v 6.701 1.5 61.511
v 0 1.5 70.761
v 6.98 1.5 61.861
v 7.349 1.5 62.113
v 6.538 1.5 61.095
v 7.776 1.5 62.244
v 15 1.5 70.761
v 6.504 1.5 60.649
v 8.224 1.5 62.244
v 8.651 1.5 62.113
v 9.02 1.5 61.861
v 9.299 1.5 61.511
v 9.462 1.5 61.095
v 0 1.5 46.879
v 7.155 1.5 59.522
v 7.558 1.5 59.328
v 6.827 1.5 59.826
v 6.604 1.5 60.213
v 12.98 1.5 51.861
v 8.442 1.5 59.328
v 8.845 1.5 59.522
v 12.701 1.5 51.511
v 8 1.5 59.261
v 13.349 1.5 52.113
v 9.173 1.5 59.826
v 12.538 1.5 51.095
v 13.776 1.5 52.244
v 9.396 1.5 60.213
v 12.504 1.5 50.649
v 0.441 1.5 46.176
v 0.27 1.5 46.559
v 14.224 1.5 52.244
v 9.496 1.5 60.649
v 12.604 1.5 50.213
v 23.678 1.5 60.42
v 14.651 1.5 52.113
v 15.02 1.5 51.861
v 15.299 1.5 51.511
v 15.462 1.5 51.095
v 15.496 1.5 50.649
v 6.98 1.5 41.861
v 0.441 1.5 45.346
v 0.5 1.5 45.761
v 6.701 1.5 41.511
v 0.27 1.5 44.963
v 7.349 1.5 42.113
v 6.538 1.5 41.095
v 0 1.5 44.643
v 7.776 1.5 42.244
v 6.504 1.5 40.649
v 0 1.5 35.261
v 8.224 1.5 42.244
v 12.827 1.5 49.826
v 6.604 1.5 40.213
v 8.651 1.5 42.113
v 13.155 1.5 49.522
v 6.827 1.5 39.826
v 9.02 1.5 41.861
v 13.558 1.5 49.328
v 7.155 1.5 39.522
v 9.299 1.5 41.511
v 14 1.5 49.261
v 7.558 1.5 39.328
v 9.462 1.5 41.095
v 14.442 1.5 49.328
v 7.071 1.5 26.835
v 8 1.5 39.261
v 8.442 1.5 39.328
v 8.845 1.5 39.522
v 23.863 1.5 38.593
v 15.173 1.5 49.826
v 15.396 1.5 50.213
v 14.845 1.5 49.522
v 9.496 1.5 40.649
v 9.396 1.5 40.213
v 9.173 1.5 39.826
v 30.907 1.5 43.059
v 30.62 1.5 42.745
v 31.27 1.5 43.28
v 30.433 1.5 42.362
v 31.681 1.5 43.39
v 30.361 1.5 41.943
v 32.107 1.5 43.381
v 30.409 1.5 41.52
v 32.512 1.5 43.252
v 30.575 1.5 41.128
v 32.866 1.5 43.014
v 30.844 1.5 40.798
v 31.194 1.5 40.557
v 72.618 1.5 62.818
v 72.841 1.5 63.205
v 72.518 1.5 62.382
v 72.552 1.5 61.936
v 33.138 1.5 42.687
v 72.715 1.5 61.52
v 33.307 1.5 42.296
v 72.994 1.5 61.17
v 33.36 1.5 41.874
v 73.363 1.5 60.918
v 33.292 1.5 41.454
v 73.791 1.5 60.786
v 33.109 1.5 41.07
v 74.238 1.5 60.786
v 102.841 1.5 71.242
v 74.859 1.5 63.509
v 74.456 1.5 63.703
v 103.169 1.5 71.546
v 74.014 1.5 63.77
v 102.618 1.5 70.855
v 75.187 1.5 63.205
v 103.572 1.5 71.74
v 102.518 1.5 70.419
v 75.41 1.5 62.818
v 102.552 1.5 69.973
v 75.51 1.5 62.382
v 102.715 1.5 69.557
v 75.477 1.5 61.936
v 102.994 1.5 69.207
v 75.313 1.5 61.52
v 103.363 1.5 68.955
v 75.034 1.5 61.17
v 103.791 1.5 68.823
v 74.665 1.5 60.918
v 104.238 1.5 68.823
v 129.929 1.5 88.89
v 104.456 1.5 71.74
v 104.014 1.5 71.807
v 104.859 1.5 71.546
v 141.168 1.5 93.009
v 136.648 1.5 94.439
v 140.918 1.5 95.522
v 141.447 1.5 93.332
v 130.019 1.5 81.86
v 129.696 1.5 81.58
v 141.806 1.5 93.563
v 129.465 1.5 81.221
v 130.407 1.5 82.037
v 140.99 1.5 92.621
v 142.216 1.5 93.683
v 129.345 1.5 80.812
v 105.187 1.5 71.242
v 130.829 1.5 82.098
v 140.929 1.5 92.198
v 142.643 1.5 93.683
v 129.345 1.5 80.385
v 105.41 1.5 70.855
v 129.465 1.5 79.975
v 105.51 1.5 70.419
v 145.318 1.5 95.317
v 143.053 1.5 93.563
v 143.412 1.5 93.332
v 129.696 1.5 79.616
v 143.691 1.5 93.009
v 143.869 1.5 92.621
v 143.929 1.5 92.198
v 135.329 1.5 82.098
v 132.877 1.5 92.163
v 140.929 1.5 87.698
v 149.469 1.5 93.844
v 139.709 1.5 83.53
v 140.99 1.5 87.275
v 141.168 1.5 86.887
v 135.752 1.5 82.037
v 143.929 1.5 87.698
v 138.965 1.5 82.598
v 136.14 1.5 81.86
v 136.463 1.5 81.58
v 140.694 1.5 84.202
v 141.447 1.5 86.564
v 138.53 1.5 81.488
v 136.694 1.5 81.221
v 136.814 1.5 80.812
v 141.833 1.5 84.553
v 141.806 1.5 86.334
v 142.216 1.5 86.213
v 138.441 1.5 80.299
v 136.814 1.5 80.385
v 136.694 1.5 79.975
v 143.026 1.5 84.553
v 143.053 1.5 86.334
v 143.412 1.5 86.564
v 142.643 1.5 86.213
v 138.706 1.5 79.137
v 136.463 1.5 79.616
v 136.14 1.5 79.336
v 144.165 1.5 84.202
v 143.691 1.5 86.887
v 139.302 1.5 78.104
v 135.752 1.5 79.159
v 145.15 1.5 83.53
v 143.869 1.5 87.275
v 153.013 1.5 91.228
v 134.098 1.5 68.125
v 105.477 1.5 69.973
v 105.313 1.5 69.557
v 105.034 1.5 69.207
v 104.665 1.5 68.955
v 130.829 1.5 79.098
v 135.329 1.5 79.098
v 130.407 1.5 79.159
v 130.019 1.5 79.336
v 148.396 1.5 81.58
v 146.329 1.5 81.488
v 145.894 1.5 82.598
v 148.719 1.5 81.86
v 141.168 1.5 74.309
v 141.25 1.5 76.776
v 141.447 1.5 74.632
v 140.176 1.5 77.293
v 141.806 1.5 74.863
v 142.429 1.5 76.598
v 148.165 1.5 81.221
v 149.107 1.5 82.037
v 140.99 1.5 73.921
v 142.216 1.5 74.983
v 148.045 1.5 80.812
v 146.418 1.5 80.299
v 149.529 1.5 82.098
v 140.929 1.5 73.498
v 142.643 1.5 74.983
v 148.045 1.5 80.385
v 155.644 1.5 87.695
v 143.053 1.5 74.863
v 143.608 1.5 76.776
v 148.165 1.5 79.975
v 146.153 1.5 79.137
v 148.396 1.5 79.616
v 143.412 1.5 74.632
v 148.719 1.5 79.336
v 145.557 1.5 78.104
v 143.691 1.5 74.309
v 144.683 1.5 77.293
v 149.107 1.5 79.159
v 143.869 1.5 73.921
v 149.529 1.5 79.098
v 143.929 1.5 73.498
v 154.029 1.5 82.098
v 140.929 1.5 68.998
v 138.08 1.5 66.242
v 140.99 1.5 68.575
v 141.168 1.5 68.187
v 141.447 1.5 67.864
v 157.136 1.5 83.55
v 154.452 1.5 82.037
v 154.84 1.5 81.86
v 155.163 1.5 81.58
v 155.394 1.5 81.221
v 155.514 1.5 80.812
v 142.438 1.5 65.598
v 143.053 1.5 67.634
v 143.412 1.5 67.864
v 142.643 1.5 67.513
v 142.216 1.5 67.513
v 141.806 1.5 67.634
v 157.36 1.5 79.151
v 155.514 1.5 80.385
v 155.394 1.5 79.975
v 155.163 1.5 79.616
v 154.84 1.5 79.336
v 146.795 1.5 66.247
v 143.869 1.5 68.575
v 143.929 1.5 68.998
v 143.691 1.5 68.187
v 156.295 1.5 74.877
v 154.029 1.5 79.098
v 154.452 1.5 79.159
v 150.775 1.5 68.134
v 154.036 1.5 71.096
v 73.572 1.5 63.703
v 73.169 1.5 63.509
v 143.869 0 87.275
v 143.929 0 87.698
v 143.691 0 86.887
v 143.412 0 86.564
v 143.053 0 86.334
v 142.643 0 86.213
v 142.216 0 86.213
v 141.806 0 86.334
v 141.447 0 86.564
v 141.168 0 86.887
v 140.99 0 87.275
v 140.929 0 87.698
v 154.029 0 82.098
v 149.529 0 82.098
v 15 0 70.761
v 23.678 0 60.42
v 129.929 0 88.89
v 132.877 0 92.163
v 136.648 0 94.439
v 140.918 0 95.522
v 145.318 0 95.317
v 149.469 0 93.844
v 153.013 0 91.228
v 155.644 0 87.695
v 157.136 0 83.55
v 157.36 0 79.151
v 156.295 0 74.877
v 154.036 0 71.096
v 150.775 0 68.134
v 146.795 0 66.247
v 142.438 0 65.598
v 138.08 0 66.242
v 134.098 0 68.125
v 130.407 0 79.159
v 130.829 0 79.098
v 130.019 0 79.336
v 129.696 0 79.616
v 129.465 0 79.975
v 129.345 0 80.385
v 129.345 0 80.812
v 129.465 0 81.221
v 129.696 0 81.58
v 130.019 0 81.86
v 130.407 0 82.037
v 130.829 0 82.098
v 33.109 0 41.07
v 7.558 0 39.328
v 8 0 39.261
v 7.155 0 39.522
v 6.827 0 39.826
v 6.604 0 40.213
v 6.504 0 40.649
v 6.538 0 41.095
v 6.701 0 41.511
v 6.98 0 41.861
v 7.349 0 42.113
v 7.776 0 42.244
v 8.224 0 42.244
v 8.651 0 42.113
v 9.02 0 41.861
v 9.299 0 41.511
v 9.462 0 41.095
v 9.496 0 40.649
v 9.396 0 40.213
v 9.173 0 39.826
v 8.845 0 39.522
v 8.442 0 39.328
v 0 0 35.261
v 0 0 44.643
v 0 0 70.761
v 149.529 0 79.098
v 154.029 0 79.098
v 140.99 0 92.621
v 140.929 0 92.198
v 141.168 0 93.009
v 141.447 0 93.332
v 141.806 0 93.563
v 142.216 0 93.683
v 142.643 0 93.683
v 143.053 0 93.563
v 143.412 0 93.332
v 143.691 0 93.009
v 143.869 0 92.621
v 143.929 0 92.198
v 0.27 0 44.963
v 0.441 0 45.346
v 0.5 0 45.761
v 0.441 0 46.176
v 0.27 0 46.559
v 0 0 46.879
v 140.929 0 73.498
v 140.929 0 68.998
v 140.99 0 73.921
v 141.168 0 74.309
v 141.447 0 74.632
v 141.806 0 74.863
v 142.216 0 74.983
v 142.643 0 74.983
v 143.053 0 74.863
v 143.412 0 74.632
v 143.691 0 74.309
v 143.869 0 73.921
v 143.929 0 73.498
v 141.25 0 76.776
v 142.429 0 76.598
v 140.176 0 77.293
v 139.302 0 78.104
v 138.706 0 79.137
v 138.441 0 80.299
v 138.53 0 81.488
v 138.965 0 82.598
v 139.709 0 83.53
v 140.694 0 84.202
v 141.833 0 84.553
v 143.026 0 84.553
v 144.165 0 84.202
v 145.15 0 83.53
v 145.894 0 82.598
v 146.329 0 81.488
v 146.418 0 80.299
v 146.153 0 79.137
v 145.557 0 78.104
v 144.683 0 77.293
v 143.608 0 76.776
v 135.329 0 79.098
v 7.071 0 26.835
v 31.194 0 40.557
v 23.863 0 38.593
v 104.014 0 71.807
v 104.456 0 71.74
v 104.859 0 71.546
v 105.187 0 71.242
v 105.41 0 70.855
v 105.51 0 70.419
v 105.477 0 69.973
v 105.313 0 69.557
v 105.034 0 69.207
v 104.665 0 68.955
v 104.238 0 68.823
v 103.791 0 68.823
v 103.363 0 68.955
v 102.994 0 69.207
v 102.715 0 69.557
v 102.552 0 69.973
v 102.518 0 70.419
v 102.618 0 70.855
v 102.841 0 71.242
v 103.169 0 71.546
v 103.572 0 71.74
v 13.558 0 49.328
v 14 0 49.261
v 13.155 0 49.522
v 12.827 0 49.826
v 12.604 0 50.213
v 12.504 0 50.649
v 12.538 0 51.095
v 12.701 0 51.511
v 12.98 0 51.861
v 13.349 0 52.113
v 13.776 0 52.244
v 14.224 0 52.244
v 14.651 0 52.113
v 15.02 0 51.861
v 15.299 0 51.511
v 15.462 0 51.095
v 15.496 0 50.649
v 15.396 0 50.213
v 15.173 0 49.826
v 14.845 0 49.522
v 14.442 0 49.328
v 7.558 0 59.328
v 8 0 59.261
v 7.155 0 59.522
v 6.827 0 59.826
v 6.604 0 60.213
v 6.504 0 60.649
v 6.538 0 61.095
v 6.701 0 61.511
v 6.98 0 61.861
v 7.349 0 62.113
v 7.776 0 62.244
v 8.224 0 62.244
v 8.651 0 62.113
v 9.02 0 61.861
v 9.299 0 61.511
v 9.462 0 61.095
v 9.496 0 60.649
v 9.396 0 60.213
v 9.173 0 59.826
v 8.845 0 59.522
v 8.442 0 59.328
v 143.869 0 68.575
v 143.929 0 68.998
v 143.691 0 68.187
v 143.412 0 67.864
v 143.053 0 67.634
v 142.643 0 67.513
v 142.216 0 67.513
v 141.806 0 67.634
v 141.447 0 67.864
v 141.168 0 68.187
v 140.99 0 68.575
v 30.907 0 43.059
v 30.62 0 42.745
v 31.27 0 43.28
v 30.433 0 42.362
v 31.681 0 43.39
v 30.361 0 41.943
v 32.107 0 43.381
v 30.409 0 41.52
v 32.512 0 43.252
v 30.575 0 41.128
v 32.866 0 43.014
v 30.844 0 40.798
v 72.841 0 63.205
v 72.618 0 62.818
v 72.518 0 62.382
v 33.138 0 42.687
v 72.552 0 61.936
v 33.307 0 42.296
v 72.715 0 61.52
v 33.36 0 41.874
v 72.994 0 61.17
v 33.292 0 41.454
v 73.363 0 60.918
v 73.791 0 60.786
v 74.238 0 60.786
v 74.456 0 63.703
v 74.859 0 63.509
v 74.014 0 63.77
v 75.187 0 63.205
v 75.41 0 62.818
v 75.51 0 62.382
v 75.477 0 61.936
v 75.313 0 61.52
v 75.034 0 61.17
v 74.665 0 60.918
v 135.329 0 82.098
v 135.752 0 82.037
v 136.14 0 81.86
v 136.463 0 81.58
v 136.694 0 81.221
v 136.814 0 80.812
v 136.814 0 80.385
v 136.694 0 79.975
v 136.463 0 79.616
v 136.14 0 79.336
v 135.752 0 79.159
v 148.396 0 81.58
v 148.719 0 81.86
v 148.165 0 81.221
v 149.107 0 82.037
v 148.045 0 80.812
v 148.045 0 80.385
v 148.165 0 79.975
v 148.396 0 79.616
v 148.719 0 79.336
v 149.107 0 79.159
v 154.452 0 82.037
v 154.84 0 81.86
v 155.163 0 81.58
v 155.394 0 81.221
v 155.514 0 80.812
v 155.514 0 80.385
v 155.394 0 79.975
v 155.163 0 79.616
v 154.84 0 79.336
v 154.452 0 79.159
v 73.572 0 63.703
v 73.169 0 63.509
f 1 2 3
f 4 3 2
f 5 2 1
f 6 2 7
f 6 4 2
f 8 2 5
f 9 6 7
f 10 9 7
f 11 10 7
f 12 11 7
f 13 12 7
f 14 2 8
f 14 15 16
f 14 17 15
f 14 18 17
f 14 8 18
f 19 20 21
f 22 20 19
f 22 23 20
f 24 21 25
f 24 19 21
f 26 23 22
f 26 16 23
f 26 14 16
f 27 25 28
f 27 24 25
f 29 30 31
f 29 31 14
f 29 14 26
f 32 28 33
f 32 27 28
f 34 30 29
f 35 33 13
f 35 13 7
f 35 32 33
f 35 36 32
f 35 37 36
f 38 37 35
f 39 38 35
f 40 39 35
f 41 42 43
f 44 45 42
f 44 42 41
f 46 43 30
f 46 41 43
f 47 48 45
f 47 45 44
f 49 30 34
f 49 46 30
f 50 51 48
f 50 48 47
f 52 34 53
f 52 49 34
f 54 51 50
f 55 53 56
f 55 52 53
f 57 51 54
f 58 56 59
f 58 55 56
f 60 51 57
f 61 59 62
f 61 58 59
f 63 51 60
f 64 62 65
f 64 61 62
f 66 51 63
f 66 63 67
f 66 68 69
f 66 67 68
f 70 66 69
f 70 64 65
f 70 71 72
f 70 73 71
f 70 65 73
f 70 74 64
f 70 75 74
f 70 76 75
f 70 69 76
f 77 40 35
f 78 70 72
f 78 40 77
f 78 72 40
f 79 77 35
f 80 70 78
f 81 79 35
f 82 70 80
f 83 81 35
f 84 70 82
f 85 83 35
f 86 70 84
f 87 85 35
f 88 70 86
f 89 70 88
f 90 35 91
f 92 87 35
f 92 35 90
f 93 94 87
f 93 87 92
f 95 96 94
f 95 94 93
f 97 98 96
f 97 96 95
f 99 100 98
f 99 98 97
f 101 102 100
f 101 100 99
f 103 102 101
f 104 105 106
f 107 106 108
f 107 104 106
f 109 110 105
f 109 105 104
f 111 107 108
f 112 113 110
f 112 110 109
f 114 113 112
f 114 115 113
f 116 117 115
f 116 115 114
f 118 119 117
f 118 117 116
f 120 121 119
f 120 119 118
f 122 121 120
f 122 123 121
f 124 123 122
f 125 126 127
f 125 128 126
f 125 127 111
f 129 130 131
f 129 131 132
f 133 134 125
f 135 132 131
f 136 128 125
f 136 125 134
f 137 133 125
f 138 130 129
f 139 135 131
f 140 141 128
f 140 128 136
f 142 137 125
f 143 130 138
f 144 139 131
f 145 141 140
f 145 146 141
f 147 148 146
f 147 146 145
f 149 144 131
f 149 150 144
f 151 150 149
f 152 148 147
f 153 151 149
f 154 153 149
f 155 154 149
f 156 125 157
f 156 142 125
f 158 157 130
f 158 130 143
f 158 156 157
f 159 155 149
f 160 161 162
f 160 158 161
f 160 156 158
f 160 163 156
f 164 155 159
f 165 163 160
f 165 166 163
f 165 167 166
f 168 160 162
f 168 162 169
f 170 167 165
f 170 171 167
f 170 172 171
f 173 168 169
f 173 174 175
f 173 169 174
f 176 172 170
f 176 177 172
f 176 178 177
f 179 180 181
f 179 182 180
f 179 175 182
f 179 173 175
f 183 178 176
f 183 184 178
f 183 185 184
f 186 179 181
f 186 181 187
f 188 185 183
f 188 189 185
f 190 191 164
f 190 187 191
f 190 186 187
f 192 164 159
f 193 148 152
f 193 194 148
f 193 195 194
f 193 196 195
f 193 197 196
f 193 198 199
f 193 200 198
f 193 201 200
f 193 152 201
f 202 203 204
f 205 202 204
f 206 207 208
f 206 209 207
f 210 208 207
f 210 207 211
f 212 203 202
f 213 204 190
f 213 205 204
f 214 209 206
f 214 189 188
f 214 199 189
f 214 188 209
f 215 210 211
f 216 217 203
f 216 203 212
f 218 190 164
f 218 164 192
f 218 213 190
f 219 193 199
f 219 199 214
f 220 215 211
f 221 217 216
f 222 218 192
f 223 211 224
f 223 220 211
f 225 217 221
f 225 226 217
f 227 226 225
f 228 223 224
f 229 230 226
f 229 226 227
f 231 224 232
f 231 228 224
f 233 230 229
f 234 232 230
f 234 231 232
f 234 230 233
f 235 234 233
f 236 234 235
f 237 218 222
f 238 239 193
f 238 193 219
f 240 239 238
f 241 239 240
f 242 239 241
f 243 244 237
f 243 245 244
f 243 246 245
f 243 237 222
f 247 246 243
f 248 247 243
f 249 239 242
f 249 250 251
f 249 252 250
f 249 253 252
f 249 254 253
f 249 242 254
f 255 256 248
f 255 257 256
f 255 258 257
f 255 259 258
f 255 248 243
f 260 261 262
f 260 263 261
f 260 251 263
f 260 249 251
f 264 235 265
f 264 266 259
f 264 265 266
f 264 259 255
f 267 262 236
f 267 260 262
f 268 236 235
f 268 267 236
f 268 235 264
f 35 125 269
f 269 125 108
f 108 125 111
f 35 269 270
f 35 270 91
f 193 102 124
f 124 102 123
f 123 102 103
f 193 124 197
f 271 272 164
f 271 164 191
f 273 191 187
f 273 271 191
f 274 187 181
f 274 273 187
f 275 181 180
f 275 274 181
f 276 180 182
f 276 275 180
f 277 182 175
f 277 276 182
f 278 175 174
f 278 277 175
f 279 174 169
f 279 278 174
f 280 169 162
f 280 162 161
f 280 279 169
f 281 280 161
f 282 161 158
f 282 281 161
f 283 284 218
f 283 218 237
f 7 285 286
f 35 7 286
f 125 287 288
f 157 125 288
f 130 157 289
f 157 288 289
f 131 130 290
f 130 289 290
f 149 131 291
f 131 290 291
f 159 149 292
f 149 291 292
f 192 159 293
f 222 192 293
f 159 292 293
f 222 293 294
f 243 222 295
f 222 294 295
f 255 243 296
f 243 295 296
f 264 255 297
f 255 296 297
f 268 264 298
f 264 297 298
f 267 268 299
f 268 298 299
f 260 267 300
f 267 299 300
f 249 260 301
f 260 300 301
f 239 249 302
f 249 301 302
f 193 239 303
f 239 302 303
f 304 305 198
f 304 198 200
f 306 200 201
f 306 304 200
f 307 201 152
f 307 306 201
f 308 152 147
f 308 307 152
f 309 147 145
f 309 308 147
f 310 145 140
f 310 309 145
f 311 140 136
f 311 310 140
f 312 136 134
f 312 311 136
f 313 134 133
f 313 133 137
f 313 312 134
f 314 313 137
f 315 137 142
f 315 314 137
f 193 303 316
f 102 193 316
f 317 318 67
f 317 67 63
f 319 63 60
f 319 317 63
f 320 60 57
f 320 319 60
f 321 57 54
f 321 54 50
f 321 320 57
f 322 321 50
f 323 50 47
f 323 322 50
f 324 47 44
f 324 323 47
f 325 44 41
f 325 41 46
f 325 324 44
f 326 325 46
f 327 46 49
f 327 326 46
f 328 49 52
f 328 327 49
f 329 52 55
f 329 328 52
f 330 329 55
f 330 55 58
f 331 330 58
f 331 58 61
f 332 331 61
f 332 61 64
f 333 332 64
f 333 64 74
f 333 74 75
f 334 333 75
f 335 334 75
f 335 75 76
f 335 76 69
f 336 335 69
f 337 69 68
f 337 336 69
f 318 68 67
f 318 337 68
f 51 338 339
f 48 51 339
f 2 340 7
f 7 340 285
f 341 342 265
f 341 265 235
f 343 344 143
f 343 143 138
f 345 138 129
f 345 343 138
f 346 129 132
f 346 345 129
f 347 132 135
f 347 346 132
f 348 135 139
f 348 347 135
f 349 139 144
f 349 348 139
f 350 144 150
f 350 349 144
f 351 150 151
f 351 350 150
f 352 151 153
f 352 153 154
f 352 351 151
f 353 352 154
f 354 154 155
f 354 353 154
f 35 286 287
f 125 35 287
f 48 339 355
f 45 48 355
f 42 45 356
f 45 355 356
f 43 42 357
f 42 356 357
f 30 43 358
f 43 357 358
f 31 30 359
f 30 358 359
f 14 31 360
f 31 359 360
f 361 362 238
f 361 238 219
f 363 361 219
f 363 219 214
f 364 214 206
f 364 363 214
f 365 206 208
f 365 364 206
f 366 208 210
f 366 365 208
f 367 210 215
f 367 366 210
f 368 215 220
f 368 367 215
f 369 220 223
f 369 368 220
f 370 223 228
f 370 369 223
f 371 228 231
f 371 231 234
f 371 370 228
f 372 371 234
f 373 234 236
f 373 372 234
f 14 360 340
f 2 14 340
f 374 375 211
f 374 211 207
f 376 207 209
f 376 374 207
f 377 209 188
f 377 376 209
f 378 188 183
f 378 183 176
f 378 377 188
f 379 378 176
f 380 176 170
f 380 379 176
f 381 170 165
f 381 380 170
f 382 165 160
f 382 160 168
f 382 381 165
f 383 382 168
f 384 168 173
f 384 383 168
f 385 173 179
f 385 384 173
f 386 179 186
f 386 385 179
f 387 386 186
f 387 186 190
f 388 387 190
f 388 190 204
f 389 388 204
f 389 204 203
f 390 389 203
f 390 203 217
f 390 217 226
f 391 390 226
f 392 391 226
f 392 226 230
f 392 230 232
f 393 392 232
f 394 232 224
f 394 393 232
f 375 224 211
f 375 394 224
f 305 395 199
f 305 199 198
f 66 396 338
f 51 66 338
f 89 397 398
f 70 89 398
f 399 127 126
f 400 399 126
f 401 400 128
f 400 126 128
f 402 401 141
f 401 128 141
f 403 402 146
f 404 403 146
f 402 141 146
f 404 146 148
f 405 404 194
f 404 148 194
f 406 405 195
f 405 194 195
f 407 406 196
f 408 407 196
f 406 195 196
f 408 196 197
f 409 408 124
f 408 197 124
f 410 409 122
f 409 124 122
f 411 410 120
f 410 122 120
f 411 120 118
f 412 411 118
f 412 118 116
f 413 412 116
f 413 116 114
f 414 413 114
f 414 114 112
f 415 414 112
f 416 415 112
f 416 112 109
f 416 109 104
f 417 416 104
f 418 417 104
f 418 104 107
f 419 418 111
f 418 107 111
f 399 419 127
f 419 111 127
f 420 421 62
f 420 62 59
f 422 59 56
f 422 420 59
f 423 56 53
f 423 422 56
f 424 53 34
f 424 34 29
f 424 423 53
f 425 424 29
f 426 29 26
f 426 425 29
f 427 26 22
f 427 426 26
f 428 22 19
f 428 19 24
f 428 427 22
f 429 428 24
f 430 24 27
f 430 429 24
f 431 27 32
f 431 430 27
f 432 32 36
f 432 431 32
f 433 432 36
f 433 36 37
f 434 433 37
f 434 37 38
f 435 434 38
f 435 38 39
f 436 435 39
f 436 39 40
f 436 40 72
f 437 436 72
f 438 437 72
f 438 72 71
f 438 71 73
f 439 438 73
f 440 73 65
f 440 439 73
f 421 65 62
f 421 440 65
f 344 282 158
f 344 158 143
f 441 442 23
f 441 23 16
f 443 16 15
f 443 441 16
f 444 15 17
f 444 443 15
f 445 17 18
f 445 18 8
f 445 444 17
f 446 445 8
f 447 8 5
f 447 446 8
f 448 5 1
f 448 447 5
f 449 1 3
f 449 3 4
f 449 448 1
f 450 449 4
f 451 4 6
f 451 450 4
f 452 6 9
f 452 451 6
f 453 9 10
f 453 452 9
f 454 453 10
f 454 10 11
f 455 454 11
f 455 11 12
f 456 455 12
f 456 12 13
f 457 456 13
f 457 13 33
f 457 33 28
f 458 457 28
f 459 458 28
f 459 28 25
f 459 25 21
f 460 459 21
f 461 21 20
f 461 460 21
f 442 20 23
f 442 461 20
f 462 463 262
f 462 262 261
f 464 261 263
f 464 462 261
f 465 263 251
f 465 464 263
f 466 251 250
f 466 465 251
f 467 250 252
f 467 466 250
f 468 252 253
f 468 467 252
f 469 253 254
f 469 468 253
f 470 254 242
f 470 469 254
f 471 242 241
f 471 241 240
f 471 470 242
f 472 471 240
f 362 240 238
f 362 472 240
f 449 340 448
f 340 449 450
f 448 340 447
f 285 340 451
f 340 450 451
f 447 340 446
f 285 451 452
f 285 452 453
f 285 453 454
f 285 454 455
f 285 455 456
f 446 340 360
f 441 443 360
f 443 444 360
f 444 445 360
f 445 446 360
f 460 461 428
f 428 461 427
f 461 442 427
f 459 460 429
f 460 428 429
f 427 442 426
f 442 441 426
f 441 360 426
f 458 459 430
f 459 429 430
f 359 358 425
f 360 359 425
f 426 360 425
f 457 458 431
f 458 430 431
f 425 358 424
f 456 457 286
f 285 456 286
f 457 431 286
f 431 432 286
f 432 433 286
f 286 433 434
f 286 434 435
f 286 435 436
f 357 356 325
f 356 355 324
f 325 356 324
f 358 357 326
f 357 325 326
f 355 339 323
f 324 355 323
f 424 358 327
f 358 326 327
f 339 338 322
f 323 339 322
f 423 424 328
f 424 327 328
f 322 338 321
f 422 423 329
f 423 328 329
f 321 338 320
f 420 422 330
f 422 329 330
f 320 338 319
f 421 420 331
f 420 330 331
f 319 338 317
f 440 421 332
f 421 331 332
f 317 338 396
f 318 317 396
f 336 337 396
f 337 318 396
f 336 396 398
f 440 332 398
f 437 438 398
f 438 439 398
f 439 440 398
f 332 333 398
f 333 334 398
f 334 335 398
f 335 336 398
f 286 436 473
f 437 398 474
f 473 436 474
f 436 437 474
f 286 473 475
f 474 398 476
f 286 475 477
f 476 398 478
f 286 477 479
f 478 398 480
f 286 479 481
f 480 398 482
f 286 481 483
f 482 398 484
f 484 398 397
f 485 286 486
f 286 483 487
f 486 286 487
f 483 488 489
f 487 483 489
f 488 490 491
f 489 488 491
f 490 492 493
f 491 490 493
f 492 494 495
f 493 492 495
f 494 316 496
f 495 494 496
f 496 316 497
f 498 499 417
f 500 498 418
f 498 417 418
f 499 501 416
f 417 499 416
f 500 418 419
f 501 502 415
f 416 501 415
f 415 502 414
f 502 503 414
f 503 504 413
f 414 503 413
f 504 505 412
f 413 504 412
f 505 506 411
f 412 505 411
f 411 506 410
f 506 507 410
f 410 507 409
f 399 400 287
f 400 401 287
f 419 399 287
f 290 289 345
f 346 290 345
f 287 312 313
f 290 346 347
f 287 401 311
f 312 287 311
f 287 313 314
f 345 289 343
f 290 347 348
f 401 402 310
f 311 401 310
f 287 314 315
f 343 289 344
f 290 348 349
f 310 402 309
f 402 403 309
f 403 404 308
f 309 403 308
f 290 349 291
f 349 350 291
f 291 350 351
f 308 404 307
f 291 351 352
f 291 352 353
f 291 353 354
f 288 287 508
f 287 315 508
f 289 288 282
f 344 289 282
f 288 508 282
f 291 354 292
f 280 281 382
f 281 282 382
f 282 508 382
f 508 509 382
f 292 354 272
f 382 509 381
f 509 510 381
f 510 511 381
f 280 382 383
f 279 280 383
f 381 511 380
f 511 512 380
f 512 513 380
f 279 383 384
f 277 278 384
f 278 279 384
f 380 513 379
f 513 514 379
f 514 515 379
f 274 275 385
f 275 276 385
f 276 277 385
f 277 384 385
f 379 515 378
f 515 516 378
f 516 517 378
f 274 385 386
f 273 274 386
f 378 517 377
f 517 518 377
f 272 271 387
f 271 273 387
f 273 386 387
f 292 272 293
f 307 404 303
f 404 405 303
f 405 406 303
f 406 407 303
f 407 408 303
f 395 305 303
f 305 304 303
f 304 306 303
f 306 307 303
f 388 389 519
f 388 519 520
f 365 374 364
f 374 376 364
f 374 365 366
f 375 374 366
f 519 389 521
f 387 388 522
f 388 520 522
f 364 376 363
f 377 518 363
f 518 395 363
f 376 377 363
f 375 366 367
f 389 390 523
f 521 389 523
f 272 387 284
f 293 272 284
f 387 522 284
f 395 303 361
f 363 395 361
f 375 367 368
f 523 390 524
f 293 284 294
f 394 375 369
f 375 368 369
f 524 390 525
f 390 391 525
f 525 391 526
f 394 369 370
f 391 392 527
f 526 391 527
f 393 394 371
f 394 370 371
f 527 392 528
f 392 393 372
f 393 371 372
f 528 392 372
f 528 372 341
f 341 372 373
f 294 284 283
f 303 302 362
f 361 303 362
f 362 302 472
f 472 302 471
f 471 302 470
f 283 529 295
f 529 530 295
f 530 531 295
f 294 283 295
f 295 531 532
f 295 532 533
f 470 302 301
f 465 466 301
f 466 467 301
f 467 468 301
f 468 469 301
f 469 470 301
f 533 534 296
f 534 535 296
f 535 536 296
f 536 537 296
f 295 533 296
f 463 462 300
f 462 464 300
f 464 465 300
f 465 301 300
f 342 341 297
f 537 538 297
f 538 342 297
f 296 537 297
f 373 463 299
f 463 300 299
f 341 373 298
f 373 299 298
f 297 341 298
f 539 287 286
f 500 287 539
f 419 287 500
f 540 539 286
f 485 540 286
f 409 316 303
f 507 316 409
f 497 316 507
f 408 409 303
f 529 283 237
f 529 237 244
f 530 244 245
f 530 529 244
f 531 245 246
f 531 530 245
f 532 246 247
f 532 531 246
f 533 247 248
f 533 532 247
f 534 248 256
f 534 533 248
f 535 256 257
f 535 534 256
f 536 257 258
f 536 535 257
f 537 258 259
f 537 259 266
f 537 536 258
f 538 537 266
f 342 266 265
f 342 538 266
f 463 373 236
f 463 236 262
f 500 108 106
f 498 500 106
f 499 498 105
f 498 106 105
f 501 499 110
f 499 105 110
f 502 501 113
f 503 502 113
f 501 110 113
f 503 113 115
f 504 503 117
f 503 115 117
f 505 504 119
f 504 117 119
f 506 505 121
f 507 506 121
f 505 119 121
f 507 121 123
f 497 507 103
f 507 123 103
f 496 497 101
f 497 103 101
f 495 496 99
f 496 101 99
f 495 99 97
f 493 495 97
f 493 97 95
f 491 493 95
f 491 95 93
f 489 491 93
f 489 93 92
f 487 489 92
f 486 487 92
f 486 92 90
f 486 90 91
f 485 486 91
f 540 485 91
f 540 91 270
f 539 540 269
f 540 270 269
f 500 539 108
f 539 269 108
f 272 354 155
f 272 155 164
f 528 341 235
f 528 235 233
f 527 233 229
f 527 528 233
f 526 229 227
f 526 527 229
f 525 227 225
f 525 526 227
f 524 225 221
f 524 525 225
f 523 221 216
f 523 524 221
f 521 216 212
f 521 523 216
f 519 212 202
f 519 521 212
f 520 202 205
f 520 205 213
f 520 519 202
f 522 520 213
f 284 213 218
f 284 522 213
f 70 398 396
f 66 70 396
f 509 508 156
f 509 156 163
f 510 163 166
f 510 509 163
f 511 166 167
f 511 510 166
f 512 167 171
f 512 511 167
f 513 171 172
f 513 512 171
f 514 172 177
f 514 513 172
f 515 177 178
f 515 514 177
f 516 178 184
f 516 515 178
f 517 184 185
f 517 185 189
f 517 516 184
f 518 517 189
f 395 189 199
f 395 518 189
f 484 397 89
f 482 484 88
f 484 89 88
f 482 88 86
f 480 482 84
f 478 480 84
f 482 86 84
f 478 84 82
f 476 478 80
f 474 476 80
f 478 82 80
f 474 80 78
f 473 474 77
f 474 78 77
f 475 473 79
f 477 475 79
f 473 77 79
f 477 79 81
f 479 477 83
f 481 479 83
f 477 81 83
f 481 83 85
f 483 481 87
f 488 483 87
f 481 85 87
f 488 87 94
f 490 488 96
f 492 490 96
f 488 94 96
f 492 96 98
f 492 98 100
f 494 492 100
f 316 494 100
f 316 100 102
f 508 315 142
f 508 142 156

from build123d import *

# Parameters (mm, degrees)
SKETCH2_R           = 1.5
SKETCH2_R_2         = 4
BOSS_EXTRUDE1_DEPTH = 1.5
SKETCH6_R           = 1.5
CUT_EXTRUDE1_DEPTH  = 1.5
SKETCH7_R           = 1.5
CUT_EXTRUDE2_DEPTH  = 1.5


with BuildPart() as part:
    # Sketch2 → Boss-Extrude1 (new body)
    with BuildSketch(Plane(origin=(0, 0, 0), x_dir=(1, 0, 0), z_dir=(0, 1, 0))):
        with BuildLine():
            Line((0, -46.879161521), (0, -70.761127532))
            Line((0, -70.761127532), (15, -70.761127532))
            Line((15, -70.761127532), (23.677632731, -60.41952755))
            Line((23.677632731, -60.41952755), (129.929473623, -88.889622511))
            ThreePointArc((129.929473623, -88.889622511), (157.136079306, -83.55030532), (134.097880355, -68.124706791))
            Line((134.097880355, -68.124706791), (23.863280614, -38.592955603))
            Line((23.863280614, -38.592955603), (7.070663707, -26.834638658))
            Line((7.070663707, -26.834638658), (0, -35.261127532))
            Line((0, -35.261127532), (0, -44.643093543))
            ThreePointArc((0, -44.643093543), (0.5, -45.761127532), (0, -46.879161521))
        make_face()
        with Locations(Location((8, -40.761127532, 0), (0, 0, 90))):
            Circle(SKETCH2_R, mode=Mode.SUBTRACT)
        with Locations(Location((14, -50.761127532, 0), (0, 0, 90))):
            Circle(SKETCH2_R, mode=Mode.SUBTRACT)
        with Locations(Location((8, -60.761127532, 0), (0, 0, 90))):
            Circle(SKETCH2_R, mode=Mode.SUBTRACT)
        with Locations(Location((142.429473623, -80.598060535, 0), (0, 0, 90))):
            Circle(SKETCH2_R_2, mode=Mode.SUBTRACT)
        with BuildLine():
            Line((143.929473623, -73.498060535), (143.929473623, -68.998060535))
            ThreePointArc((143.929473623, -68.998060535), (142.429473623, -67.498060535), (140.929473623, -68.998060535))
            Line((140.929473623, -68.998060535), (140.929473623, -73.498060535))
            ThreePointArc((140.929473623, -73.498060535), (142.429473623, -74.998060535), (143.929473623, -73.498060535))
        make_face(mode=Mode.SUBTRACT)
        with BuildLine():
            Line((149.529473623, -82.098060535), (154.029473623, -82.098060535))
            ThreePointArc((154.029473623, -82.098060535), (155.529473623, -80.598060535), (154.029473623, -79.098060535))
            Line((154.029473623, -79.098060535), (149.529473623, -79.098060535))
            ThreePointArc((149.529473623, -79.098060535), (148.029473623, -80.598060535), (149.529473623, -82.098060535))
        make_face(mode=Mode.SUBTRACT)
        with BuildLine():
            Line((140.929473623, -87.698060535), (140.929473623, -92.198060535))
            ThreePointArc((140.929473623, -92.198060535), (142.429473623, -93.698060535), (143.929473623, -92.198060535))
            Line((143.929473623, -92.198060535), (143.929473623, -87.698060535))
            ThreePointArc((143.929473623, -87.698060535), (142.429473623, -86.198060535), (140.929473623, -87.698060535))
        make_face(mode=Mode.SUBTRACT)
        with BuildLine():
            Line((135.329473623, -79.098060535), (130.829473623, -79.098060535))
            ThreePointArc((130.829473623, -79.098060535), (129.329473623, -80.598060535), (130.829473623, -82.098060535))
            Line((130.829473623, -82.098060535), (135.329473623, -82.098060535))
            ThreePointArc((135.329473623, -82.098060535), (136.829473623, -80.598060535), (135.329473623, -79.098060535))
        make_face(mode=Mode.SUBTRACT)
    extrude(amount=BOSS_EXTRUDE1_DEPTH)

    # Sketch6 → Cut-Extrude1 (cut)
    with BuildSketch(Plane(origin=(0, 1.5, 0), x_dir=(1, 0, 0), z_dir=(0, 1, 0))):
        with Locations((31.86, -41.901127532)):
            Circle(SKETCH6_R)
    extrude(amount=-CUT_EXTRUDE1_DEPTH, mode=Mode.SUBTRACT)

    # Sketch7 → Cut-Extrude2 (cut)
    with BuildSketch(Plane(origin=(0, 1.5, 0), x_dir=(1, 0, 0), z_dir=(0, 1, 0))):
        with Locations(Location((74.014122572, -62.269648862, 0), (0, 0, 270))):
            Circle(SKETCH7_R)
        with Locations(Location((104.014122572, -70.306622169, 0), (0, 0, 270))):
            Circle(SKETCH7_R)
    extrude(amount=-CUT_EXTRUDE2_DEPTH, mode=Mode.SUBTRACT)


solid = part.part
